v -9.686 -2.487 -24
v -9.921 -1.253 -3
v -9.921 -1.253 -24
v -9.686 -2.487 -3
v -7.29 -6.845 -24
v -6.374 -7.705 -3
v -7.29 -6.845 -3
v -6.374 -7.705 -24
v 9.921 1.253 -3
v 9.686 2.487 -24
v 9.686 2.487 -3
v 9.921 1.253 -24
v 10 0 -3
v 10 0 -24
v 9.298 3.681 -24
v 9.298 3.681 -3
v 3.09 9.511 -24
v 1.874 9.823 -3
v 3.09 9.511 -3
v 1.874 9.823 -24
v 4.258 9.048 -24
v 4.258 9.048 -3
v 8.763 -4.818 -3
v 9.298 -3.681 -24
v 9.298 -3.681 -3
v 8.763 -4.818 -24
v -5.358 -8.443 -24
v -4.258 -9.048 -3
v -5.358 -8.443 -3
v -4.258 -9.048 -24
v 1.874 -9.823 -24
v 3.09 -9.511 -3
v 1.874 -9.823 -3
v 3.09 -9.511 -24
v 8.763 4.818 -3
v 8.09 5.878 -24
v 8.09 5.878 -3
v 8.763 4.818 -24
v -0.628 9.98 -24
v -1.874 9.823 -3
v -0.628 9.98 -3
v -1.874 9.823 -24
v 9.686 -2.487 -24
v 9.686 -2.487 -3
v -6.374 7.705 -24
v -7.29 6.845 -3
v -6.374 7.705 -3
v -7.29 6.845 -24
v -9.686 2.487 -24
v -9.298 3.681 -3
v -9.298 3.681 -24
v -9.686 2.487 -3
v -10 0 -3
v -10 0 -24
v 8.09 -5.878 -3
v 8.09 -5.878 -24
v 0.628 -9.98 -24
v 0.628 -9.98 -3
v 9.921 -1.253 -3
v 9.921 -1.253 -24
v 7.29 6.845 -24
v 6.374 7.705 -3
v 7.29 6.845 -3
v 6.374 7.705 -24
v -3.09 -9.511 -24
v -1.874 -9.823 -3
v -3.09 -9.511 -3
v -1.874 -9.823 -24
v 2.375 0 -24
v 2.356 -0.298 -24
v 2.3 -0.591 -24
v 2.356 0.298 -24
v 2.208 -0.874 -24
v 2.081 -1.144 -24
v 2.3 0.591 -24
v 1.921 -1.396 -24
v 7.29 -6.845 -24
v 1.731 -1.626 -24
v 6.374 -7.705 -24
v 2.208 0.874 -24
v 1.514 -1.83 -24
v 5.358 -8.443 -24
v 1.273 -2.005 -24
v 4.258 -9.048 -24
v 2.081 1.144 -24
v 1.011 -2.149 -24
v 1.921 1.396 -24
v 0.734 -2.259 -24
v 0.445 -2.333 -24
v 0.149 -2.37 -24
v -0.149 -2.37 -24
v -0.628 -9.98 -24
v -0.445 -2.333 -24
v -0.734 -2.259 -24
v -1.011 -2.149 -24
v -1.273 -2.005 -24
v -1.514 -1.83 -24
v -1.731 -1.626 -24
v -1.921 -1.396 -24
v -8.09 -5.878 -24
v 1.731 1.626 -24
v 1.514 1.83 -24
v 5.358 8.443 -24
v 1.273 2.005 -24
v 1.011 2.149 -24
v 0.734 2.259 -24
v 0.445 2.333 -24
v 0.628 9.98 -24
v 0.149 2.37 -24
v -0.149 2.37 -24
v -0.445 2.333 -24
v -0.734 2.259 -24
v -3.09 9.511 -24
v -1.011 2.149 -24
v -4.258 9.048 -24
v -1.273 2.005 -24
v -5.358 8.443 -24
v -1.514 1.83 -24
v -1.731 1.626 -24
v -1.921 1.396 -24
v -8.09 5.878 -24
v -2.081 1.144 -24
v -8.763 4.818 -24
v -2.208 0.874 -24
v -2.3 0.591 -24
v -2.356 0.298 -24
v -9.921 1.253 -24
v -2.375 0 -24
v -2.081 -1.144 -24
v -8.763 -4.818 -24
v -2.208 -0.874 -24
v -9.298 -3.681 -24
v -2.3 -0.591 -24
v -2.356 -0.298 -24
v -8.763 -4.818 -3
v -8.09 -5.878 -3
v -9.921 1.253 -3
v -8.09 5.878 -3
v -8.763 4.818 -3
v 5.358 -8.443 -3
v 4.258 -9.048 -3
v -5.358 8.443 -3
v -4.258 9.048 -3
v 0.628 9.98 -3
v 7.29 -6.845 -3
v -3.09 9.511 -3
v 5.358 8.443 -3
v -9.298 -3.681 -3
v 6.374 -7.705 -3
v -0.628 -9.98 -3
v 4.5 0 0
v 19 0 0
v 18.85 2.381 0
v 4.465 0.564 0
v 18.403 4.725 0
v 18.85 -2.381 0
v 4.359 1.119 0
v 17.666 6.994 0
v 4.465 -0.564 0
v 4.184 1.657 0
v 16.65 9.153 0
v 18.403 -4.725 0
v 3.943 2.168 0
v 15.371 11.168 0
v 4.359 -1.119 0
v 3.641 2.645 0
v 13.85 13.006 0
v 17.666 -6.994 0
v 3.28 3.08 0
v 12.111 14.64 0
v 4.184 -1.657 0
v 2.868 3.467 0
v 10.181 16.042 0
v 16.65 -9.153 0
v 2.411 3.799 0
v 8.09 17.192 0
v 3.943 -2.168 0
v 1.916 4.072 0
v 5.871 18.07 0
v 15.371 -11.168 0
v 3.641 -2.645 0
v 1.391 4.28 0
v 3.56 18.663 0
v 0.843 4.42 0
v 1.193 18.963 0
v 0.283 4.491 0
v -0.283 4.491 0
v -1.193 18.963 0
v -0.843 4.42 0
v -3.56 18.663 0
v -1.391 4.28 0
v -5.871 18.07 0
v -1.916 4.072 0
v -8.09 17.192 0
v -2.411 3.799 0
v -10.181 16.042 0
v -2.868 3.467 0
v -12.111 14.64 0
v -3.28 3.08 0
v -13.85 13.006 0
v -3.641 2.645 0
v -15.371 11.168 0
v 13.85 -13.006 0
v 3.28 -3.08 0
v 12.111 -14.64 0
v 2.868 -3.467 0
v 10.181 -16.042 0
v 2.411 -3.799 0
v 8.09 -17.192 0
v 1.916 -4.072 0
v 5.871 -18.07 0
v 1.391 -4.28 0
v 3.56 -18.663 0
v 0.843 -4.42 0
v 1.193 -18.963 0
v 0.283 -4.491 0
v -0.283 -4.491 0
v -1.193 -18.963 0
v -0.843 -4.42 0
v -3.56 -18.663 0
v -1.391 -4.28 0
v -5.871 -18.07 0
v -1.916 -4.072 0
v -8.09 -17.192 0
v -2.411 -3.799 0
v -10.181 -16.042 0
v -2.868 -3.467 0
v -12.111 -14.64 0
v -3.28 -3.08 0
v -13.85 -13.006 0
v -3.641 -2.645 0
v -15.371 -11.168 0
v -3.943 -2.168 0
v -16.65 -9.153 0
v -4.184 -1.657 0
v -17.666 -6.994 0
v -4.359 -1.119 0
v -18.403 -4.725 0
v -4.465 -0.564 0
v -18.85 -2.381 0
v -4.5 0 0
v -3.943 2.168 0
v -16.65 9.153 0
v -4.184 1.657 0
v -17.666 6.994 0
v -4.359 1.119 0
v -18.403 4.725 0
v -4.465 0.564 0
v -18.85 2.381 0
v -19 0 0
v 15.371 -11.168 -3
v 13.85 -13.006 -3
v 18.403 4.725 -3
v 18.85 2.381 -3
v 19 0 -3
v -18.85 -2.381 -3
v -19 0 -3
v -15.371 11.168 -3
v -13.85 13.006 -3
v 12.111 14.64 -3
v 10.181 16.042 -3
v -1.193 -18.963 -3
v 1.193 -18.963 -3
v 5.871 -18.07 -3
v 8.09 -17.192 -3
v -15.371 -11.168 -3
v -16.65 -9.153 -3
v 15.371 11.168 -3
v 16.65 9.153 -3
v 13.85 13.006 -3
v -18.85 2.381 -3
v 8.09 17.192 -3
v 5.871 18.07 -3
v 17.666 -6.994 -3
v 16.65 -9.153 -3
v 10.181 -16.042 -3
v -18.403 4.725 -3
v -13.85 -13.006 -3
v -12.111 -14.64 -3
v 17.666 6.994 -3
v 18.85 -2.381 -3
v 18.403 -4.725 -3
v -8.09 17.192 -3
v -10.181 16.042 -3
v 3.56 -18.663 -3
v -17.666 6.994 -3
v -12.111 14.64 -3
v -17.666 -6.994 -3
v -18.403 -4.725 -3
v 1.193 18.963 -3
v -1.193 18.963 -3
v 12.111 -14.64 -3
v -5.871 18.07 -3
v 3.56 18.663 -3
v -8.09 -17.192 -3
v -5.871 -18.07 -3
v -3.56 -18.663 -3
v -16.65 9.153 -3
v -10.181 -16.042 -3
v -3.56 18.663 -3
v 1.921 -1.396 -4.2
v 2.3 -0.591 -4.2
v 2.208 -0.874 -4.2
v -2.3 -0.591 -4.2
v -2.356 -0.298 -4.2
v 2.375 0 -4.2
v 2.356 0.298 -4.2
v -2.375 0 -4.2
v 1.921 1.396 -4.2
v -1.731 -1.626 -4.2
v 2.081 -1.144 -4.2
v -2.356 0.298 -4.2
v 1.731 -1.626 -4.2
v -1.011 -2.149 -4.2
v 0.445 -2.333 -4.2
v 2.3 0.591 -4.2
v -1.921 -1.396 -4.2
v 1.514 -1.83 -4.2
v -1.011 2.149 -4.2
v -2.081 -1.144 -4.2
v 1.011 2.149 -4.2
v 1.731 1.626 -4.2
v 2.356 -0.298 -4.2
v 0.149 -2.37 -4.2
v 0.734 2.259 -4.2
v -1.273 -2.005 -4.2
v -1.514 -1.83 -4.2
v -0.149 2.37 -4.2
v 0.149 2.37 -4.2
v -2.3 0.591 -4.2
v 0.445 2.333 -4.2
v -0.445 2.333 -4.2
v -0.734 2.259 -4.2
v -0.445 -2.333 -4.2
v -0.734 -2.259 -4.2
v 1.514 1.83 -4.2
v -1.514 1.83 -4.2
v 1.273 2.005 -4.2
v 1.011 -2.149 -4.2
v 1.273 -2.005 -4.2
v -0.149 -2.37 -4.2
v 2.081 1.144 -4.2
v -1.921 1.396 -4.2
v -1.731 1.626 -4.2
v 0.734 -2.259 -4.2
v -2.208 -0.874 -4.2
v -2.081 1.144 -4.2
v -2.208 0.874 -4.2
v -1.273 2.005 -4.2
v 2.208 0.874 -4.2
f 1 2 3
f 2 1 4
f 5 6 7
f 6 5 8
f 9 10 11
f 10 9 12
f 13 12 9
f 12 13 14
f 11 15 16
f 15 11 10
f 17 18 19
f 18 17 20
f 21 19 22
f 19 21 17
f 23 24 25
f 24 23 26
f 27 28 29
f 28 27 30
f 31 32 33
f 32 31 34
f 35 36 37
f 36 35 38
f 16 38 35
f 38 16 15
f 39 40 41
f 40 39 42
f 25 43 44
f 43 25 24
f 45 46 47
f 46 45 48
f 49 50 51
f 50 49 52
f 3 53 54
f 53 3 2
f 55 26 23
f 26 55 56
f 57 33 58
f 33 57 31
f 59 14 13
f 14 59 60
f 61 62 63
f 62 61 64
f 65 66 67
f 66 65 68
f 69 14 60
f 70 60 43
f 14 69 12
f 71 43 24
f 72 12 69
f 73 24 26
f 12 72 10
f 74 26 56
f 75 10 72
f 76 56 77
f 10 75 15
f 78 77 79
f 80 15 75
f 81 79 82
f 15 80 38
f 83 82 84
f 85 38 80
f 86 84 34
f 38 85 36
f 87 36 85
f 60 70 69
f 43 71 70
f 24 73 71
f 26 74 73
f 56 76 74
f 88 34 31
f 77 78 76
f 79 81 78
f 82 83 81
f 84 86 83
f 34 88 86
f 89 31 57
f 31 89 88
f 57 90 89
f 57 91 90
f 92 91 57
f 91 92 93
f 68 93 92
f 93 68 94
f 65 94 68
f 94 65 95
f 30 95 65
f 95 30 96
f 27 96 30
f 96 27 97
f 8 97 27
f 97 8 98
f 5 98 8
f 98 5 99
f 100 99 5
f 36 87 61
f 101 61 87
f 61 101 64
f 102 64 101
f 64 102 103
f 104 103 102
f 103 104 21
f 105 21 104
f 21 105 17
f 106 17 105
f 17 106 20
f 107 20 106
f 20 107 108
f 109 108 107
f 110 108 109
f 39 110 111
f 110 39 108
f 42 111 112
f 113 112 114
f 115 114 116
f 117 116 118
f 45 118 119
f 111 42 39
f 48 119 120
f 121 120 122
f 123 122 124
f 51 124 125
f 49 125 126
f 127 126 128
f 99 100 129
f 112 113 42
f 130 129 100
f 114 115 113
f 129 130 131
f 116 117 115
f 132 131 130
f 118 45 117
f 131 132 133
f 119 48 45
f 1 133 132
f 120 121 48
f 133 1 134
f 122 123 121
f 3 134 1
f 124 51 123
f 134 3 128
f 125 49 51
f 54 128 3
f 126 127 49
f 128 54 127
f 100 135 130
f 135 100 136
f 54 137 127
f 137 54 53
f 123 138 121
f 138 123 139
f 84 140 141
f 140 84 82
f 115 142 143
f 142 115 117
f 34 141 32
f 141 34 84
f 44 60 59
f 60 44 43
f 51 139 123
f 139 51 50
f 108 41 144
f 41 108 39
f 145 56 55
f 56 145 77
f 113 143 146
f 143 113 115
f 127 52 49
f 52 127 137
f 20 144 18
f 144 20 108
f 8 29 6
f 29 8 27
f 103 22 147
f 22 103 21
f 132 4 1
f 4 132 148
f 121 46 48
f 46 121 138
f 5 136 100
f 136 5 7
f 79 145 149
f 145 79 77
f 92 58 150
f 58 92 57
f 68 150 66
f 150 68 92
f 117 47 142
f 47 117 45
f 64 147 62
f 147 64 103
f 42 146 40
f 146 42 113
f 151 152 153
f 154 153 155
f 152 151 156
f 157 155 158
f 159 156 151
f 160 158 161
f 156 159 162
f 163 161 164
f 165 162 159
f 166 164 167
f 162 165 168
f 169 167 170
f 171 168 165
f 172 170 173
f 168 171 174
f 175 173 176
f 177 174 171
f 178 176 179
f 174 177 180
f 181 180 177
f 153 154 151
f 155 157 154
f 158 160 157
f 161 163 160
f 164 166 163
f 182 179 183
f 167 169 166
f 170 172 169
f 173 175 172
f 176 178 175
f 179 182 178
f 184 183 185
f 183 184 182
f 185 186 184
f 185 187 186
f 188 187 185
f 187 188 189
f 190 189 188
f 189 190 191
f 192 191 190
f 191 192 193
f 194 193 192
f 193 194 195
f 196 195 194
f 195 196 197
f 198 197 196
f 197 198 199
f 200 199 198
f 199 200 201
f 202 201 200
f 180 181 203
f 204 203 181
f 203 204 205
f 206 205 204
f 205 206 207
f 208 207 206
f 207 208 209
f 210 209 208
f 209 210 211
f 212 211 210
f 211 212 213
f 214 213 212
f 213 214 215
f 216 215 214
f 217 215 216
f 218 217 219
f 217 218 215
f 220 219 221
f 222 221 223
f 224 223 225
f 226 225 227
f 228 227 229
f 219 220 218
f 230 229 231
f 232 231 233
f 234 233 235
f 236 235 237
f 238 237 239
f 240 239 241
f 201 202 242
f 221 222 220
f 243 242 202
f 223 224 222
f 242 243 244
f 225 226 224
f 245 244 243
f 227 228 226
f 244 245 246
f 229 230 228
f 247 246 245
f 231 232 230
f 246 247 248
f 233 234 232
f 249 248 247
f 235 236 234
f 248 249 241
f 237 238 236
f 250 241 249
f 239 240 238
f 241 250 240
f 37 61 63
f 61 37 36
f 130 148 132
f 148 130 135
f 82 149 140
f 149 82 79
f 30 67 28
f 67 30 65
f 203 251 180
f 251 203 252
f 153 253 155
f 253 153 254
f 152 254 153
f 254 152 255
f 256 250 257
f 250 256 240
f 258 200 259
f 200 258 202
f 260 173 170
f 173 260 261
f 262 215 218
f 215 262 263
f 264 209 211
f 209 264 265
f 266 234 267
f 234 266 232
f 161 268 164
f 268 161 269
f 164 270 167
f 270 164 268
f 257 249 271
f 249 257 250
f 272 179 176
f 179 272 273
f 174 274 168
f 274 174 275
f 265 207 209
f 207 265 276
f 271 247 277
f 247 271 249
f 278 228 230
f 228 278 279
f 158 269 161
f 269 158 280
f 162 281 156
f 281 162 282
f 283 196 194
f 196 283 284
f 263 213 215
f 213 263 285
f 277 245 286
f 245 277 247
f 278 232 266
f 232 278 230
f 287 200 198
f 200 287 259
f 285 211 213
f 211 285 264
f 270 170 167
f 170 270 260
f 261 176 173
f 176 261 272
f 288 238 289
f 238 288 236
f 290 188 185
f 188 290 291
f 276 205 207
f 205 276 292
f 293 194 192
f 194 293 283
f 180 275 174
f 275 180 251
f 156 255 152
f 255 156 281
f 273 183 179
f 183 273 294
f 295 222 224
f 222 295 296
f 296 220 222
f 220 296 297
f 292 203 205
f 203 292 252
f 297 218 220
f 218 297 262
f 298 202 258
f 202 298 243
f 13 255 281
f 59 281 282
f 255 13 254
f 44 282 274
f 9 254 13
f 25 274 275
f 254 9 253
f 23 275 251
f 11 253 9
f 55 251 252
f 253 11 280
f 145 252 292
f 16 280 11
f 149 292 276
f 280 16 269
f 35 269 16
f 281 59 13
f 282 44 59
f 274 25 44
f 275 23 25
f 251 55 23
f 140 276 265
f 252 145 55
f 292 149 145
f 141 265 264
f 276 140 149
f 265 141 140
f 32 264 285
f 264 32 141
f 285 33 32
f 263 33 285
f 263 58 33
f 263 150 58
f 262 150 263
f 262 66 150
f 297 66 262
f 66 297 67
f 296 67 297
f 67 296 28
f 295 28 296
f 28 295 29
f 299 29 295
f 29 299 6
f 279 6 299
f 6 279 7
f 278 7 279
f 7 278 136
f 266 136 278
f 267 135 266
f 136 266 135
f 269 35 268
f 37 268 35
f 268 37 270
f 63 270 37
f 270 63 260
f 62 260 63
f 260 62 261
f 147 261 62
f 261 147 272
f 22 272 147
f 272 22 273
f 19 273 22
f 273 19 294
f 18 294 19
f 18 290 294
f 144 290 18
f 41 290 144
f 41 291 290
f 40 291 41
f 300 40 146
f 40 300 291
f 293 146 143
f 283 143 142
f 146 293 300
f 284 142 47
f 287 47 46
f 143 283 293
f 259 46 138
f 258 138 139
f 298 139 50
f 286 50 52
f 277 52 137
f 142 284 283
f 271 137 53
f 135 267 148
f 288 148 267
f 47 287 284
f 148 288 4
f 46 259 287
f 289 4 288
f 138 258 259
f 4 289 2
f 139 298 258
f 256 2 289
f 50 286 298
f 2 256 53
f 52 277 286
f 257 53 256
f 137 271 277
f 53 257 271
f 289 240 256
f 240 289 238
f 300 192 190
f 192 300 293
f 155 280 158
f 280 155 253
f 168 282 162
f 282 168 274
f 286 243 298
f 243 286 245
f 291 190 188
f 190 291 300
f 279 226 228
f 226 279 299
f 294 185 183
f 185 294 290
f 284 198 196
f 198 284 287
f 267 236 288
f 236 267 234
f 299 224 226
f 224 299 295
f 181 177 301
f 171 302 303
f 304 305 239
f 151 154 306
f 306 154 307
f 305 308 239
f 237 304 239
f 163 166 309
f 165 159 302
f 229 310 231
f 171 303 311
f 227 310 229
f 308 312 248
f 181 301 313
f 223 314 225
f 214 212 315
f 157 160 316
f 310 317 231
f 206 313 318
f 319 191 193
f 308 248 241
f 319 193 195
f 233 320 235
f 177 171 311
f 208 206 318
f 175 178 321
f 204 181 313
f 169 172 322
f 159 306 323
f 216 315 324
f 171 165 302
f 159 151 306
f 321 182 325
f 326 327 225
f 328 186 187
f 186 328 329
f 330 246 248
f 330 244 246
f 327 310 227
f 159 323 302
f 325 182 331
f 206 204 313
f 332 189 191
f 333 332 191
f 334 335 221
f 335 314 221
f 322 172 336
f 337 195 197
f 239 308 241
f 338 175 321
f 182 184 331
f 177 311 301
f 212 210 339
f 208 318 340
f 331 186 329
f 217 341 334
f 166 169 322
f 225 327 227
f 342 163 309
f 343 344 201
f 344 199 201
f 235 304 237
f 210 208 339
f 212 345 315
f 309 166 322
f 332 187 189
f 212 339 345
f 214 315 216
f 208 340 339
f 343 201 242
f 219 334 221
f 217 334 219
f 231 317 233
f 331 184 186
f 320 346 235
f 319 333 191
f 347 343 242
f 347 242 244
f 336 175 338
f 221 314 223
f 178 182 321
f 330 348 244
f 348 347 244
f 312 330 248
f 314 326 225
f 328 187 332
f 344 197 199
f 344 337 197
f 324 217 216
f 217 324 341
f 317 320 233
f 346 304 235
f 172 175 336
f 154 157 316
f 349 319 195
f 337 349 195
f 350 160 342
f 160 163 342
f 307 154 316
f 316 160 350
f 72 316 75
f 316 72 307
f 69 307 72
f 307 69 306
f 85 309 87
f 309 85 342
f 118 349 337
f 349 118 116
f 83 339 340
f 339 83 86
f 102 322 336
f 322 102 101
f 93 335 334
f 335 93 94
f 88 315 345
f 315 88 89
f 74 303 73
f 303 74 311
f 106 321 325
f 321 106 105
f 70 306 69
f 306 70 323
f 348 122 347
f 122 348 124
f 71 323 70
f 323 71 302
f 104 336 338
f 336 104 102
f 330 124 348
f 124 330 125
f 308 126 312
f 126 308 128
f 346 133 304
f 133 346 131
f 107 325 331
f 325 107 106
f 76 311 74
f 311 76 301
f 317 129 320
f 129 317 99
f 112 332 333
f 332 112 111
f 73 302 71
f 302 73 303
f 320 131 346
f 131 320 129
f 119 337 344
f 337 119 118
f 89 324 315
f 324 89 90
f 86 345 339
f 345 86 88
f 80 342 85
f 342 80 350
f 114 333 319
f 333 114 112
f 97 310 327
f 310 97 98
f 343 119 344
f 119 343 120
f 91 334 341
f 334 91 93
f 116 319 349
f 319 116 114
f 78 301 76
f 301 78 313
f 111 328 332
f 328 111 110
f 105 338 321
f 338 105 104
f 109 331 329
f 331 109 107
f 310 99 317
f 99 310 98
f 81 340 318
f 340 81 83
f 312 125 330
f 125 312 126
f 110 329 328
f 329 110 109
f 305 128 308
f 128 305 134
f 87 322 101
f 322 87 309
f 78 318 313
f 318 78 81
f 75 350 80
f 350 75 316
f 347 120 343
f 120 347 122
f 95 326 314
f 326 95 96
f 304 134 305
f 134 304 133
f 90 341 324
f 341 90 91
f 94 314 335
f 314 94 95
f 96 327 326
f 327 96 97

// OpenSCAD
$fn = 50;


difference() {
	union() {
		translate(v = [0, 0, -24.0000000000]) {
			cylinder(h = 24, r = 10.0000000000);
		}
		translate(v = [0, 0, -3.0000000000]) {
			cylinder(h = 3, r = 19.0000000000);
		}
	}
	union() {
		translate(v = [0, 0, 0]) {
			rotate(a = [0, 0, 0]) {
				difference() {
					union() {
						#translate(v = [0, 0, -24.0000000000]) {
							cylinder(h = 24, r = 2.2500000000);
						}
						#translate(v = [0, 0, -4.2000000000]) {
							cylinder(h = 4.2000000000, r1 = 2.3750000000, r2 = 4.5000000000);
						}
						#translate(v = [0, 0, -24.0000000000]) {
							cylinder(h = 24, r = 2.3750000000);
						}
						#translate(v = [0, 0, -24.0000000000]) {
							cylinder(h = 24, r = 2.2500000000);
						}
					}
					union();
				}
			}
		}
	}
}
